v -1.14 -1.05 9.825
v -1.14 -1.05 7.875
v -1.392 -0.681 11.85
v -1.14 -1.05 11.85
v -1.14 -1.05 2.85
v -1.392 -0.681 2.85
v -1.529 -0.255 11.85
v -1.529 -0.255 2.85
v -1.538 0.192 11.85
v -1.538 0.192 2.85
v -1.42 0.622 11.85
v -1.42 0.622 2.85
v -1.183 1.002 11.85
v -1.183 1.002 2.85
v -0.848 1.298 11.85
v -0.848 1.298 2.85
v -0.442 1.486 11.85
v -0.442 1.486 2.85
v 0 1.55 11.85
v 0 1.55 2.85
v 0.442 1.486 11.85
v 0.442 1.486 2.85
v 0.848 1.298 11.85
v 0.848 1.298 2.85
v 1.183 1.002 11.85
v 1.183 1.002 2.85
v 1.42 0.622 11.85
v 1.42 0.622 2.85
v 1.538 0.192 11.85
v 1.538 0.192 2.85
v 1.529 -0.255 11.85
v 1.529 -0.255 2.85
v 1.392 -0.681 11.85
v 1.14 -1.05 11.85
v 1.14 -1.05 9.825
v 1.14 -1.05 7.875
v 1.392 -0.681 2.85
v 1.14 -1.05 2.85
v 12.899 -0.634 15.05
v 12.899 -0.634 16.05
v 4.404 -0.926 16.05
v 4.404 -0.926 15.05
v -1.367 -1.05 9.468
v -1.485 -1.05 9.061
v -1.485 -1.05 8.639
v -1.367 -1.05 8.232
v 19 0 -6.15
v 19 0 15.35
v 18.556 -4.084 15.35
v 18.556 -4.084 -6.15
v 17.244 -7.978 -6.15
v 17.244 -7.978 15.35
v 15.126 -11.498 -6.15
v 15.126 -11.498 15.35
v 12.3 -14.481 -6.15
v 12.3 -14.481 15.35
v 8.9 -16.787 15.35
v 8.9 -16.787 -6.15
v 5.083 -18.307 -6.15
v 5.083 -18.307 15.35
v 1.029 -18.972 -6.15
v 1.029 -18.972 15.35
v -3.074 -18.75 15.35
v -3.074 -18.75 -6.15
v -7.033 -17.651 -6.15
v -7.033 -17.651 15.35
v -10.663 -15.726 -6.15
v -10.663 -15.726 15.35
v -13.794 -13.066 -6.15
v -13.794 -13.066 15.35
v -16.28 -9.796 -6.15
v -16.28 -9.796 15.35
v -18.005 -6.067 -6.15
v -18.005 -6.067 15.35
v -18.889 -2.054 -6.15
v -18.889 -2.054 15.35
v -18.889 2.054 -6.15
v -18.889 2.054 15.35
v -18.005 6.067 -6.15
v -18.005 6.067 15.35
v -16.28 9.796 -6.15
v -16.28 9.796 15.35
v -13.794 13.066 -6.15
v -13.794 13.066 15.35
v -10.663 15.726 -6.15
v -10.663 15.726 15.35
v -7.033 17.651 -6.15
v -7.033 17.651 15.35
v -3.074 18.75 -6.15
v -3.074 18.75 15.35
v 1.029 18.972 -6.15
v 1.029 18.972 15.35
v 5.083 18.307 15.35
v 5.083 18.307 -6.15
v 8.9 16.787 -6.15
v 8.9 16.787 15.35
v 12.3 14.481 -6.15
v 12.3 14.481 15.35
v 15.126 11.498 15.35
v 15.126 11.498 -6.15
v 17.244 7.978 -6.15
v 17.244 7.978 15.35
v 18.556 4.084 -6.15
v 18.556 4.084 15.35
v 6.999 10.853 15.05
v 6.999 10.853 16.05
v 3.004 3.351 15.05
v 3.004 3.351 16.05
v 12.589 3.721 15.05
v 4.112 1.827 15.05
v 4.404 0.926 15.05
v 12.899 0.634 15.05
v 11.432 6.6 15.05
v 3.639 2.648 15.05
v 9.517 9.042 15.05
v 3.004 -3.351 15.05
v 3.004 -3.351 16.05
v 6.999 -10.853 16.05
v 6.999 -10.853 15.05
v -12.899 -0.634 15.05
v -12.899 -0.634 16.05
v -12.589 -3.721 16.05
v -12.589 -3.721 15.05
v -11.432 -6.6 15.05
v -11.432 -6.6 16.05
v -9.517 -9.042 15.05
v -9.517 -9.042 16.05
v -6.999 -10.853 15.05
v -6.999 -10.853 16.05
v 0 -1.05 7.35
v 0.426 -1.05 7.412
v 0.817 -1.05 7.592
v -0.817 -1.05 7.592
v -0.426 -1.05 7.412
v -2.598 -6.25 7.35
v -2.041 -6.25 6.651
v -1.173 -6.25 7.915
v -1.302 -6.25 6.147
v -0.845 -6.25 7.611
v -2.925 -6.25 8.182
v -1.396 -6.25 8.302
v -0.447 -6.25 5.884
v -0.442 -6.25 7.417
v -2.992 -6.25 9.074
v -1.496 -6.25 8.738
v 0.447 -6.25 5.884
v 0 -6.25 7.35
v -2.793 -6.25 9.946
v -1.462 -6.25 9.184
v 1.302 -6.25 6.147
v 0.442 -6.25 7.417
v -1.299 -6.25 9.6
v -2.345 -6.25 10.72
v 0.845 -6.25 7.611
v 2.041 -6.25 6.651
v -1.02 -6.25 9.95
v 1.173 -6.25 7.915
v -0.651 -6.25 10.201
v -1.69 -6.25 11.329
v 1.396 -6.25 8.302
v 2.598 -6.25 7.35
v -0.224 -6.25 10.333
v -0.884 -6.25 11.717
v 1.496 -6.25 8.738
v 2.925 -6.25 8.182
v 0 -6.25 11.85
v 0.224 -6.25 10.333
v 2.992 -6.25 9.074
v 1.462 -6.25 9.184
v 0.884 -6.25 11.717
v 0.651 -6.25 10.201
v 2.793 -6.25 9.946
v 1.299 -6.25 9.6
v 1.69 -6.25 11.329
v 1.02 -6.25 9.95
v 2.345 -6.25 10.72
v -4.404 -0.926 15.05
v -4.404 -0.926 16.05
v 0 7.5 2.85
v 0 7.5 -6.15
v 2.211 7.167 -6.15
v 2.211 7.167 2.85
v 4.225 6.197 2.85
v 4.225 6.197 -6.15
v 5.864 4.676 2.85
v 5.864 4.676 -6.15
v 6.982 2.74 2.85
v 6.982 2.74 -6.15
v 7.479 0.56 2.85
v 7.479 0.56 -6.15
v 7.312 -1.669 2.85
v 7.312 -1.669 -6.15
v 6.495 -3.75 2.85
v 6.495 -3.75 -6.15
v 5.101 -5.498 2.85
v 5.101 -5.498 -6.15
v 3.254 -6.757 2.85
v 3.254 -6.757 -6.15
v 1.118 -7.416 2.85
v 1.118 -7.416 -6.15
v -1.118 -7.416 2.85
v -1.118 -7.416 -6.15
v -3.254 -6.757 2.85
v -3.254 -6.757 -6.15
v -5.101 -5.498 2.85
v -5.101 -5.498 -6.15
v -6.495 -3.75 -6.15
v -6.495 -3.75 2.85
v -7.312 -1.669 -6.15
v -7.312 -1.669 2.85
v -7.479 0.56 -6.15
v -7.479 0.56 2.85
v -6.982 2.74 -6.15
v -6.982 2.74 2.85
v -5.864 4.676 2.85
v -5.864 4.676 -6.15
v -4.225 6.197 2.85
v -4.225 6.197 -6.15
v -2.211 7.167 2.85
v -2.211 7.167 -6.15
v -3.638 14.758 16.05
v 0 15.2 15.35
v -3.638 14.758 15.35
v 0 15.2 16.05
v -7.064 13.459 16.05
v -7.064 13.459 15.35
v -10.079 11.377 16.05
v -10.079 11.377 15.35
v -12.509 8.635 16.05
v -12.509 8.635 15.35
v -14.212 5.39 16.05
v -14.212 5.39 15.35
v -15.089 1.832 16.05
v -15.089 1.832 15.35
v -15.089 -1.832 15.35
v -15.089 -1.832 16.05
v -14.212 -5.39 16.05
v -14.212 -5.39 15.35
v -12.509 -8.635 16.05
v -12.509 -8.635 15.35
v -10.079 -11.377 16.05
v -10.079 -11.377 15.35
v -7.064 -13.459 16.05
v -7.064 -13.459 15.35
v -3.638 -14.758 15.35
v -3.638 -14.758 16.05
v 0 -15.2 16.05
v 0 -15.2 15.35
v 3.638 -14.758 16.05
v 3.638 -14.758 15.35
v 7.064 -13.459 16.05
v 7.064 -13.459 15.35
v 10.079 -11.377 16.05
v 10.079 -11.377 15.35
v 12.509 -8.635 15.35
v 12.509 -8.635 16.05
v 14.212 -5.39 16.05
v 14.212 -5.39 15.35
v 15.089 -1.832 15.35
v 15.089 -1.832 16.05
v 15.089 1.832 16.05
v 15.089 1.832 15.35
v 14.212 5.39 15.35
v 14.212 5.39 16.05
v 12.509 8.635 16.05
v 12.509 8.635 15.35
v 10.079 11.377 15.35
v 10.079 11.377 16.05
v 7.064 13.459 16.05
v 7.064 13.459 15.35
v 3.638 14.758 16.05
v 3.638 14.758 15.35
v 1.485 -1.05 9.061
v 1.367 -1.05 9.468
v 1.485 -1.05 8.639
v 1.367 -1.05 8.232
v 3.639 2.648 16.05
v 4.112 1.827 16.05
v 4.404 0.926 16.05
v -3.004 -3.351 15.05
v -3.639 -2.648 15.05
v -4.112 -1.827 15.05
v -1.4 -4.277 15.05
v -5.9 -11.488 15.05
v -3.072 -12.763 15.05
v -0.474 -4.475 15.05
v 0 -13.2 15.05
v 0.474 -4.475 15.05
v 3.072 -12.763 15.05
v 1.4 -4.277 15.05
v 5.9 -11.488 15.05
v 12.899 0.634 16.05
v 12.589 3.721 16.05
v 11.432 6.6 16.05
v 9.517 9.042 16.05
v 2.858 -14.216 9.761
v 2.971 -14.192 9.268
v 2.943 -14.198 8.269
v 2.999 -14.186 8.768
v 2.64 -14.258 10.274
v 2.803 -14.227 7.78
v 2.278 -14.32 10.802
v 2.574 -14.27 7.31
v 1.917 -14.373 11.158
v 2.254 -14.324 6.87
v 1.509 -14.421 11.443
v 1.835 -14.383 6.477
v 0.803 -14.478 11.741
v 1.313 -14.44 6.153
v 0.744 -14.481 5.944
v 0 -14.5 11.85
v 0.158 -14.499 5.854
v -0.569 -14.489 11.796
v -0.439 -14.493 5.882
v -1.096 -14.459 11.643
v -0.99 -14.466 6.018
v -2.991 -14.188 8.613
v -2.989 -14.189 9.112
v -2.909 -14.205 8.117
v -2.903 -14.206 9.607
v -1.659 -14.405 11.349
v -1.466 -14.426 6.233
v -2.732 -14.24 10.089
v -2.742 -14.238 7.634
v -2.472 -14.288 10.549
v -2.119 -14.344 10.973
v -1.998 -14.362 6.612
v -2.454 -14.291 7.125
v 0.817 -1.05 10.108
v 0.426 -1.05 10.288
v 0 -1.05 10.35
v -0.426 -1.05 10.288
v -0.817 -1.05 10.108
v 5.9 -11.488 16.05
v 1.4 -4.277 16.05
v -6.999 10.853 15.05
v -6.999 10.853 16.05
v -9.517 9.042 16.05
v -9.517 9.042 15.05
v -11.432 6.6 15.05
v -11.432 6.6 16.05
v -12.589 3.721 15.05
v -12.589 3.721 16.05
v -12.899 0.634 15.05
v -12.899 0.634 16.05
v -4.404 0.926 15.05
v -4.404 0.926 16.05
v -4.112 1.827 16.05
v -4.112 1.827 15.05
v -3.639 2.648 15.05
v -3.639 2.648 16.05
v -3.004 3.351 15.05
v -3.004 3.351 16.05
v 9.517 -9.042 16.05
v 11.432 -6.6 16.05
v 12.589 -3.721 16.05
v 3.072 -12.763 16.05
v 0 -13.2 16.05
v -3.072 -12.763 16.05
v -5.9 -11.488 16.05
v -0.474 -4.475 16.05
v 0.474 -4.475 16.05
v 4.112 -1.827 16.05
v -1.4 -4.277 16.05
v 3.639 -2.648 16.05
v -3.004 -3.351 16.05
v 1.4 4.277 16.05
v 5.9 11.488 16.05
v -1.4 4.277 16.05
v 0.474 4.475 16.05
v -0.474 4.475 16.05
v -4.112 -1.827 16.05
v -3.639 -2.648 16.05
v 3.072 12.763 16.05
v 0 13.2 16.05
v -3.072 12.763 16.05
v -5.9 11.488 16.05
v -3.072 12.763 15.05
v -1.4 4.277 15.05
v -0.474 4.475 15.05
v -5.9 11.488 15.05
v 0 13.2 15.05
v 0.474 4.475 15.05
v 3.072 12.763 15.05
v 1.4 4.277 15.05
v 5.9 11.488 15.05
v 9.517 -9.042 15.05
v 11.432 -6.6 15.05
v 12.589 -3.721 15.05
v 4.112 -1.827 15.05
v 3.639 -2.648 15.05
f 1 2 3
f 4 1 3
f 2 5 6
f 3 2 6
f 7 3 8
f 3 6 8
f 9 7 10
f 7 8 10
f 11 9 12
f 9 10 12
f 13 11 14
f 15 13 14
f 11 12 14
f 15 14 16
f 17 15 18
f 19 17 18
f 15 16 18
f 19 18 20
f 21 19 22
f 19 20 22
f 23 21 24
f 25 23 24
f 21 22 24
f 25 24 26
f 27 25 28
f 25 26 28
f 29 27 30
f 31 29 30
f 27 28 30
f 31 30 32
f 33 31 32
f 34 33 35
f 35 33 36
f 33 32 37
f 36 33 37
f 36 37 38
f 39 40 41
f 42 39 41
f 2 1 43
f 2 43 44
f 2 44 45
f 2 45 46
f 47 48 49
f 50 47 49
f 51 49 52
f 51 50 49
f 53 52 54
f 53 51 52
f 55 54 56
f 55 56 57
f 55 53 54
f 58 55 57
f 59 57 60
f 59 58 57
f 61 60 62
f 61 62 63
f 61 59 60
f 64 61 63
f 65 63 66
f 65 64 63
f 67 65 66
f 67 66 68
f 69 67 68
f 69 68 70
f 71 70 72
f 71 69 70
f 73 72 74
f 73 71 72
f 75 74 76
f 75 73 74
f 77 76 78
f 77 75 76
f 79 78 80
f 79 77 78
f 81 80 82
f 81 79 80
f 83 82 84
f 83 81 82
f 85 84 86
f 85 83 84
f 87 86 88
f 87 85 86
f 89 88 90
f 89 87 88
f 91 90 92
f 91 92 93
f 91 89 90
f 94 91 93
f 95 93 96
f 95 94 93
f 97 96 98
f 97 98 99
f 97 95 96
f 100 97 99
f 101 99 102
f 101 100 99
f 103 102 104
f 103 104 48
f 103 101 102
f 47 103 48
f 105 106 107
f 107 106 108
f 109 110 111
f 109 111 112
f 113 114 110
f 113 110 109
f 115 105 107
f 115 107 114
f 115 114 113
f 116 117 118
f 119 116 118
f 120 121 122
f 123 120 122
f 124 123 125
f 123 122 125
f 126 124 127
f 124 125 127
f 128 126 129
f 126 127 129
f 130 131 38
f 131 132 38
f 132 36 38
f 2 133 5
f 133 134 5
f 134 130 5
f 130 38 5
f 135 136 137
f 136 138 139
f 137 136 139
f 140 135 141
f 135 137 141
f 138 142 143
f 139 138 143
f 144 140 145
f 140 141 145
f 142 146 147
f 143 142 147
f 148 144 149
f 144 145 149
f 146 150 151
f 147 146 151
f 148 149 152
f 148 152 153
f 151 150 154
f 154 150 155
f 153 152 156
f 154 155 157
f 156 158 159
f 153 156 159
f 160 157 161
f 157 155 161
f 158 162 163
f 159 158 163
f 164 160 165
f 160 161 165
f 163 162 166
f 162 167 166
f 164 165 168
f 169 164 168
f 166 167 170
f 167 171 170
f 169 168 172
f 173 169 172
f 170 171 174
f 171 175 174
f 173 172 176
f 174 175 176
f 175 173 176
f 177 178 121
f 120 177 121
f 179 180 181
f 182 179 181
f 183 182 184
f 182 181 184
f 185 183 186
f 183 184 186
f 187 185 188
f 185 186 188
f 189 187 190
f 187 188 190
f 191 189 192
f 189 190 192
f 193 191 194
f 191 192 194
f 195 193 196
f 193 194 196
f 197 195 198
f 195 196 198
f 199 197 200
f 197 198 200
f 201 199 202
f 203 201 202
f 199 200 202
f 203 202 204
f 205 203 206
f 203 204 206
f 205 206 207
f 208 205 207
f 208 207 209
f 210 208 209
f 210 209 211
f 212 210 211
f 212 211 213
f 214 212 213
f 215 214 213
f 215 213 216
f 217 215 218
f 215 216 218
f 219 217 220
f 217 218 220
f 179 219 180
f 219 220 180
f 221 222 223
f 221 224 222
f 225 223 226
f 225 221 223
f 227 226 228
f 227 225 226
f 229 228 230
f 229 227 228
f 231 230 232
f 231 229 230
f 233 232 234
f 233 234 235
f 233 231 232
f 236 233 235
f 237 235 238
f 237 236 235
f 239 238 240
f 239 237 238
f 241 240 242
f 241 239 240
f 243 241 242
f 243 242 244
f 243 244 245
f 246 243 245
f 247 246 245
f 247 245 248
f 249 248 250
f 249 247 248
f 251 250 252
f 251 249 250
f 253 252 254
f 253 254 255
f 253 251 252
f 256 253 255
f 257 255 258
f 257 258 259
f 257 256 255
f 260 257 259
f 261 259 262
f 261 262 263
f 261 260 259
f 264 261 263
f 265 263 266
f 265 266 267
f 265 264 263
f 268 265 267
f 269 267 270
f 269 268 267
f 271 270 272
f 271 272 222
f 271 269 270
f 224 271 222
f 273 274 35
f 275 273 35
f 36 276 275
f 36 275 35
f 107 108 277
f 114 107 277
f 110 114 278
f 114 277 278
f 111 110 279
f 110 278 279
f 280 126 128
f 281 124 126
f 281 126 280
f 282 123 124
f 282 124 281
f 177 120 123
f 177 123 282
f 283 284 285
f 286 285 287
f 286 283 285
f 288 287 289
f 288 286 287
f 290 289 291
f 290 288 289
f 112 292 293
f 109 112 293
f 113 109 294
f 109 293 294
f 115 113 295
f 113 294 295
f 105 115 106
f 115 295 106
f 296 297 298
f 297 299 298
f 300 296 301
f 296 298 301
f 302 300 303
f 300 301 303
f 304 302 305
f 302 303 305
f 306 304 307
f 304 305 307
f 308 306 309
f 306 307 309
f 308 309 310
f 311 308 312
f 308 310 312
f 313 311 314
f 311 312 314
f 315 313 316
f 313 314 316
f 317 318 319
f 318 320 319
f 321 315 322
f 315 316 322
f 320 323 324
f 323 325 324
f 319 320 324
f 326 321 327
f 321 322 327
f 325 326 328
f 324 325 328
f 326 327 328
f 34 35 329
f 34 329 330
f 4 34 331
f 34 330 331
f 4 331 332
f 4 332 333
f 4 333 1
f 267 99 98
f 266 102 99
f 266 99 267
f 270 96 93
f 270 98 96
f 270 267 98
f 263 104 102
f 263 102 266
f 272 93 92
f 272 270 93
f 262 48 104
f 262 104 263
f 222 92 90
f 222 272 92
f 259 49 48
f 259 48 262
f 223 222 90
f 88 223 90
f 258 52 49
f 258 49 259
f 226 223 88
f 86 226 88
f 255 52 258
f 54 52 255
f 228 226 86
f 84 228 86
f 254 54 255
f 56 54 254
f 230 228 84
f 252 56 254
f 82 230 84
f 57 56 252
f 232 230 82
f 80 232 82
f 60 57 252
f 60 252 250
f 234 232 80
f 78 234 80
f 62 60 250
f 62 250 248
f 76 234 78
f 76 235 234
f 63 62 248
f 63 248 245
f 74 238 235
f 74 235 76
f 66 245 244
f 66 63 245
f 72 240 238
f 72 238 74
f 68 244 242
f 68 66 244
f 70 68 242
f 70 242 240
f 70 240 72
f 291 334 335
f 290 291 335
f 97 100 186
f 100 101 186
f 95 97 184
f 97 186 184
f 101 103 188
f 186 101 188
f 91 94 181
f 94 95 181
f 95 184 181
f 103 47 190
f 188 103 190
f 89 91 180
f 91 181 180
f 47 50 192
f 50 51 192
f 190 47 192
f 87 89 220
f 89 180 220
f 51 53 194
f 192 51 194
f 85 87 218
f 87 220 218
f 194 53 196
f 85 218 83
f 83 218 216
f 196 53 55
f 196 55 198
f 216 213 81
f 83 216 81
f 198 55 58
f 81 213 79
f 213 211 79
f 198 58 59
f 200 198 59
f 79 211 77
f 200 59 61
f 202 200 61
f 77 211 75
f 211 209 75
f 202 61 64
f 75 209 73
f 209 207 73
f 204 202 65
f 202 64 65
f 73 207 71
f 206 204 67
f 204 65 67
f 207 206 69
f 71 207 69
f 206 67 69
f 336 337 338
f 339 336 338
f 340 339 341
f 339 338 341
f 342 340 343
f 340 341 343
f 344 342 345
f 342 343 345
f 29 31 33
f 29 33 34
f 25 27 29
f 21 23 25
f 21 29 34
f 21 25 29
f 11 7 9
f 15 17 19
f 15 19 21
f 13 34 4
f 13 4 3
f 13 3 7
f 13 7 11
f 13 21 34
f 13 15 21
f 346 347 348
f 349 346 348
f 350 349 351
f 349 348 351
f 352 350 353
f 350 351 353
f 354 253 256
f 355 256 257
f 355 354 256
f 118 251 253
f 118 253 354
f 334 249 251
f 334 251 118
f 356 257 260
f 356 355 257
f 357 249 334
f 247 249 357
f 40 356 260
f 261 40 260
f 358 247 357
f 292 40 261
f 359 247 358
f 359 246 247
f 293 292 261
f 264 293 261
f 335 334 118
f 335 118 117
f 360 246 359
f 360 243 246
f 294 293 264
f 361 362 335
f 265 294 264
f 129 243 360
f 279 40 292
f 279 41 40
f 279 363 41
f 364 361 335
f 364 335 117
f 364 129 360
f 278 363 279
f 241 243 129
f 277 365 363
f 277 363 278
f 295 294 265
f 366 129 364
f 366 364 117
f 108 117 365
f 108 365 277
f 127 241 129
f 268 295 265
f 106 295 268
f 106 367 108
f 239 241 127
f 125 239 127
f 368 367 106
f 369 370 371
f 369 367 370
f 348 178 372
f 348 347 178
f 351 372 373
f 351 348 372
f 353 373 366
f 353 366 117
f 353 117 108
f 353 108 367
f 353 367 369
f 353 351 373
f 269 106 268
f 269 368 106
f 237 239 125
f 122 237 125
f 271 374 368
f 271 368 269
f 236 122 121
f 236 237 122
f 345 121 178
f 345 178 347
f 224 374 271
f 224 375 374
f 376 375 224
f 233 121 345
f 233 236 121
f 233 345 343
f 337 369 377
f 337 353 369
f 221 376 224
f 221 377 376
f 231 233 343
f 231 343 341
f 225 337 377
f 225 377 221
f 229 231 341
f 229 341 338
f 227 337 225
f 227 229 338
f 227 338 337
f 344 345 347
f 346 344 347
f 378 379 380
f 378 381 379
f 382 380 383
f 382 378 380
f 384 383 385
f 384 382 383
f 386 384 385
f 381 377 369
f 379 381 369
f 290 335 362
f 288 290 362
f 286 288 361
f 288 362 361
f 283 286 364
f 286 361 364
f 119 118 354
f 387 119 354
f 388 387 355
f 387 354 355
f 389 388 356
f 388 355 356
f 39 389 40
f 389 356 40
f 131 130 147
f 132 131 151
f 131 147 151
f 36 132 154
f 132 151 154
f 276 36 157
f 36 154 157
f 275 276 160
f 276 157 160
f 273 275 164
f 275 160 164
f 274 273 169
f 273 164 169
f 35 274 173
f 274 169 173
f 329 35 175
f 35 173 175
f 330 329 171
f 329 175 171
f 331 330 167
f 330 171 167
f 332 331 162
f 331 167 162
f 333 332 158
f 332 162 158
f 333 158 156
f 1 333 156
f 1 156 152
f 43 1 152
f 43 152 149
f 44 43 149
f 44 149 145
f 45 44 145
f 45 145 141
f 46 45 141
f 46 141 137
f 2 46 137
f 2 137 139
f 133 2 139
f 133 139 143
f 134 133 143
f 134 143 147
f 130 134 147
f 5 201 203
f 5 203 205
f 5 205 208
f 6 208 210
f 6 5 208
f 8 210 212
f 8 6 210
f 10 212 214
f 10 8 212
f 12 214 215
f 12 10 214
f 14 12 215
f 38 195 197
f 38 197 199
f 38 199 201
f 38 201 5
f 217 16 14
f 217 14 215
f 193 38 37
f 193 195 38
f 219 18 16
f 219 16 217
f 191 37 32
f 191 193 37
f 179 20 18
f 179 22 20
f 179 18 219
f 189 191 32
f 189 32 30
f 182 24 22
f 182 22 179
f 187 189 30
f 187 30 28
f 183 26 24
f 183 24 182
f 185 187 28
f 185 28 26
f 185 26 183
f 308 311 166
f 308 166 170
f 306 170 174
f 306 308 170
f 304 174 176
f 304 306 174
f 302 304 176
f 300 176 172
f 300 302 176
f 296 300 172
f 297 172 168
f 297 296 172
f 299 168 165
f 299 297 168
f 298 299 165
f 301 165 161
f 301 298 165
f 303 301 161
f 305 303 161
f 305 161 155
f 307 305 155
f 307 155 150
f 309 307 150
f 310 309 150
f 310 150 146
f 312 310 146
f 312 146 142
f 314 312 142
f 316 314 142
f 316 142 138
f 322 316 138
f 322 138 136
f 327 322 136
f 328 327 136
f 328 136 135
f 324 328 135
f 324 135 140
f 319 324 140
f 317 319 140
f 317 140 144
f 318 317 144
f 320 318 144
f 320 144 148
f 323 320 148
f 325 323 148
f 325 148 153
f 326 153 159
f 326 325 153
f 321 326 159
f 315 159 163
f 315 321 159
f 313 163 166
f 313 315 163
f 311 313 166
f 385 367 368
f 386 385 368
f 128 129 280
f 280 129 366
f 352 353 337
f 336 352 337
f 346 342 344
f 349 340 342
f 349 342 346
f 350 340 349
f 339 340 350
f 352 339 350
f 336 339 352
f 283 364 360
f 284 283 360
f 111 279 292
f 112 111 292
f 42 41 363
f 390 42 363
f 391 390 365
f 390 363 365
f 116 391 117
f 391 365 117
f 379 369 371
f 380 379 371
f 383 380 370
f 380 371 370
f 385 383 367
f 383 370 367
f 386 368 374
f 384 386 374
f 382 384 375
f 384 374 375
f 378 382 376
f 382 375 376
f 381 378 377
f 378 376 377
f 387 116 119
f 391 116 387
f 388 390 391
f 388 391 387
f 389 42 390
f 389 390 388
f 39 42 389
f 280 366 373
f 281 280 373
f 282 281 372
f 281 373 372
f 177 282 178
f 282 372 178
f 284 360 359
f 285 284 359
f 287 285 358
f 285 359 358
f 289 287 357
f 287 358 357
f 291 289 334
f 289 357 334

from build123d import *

# Parameters (mm, degrees)
CORTAR_EXTRUIR4_DEPTH      = 1
CROQUIS7_R                 = 7.5
CORTAR_EXTRUIR5_DEPTH      = 9
CORTAR_EXTRUIR6_DEPTH      = 9
CORTAR_EXTRUIR8_DEPTH      = 5
CORTAR_EXTRUIR8_DEPTH_BACK = 35.470929781
CROQUIS10_R                = 3
CROQUIS11_R                = 1.5
CORTAR_EXTRUIR9_DEPTH      = 5.2
CROQUIS12_W                = 21.5
CROQUIS12_H                = 4.5


with BuildPart() as part:
    # Croquis1 → Revolución1 (revolve)
    with BuildSketch(Plane(origin=(0, 0, 0), x_dir=(0, 0, -1), z_dir=(1, 0, 0))):
        Polygon((0, 0), (6.15, 0), (6.15, 14.5), (-15.35, 14.5), (-15.35, 15.2), (-16.05, 15.2), (-16.05, 0), align=None)
    revolve(axis=Axis((0, 0, 0), (0, 0, 1)))

    # Croquis5 → Cortar-Extruir4 (cut)
    with BuildSketch(Plane.XY.offset(16.05)):
        with BuildLine():
            ThreePointArc((-1.4, 4.276680956), (0, 4.5), (1.4, 4.276680956))
            Line((1.4, 4.276680956), (5.9, 11.487783507))
            ThreePointArc((5.9, 11.487783507), (0, 13.2), (-5.9, 11.487783507))
            Line((-5.9, 11.487783507), (-1.4, 4.276680956))
        make_face()
        with BuildLine():
            Line((6.99871235, 10.853441636), (3.003714352, 3.350776043))
            ThreePointArc((3.003714352, 3.350776043), (3.897114317, 2.25), (4.403714352, 0.925904913))
            Line((4.403714352, 0.925904913), (12.89871235, 0.634341871))
            ThreePointArc((12.89871235, 0.634341871), (11.43153533, 6.6), (6.99871235, 10.853441636))
        make_face()
        with BuildLine():
            Line((12.89871235, -0.634341871), (4.403714352, -0.925904913))
            ThreePointArc((4.403714352, -0.925904913), (3.897114317, -2.25), (3.003714352, -3.350776043))
            Line((3.003714352, -3.350776043), (6.99871235, -10.853441636))
            ThreePointArc((6.99871235, -10.853441636), (11.43153533, -6.6), (12.89871235, -0.634341871))
        make_face()
        with BuildLine():
            Line((5.9, -11.487783507), (1.4, -4.276680956))
            ThreePointArc((1.4, -4.276680956), (0, -4.5), (-1.4, -4.276680956))
            Line((-1.4, -4.276680956), (-5.9, -11.487783507))
            ThreePointArc((-5.9, -11.487783507), (0, -13.2), (5.9, -11.487783507))
        make_face()
        with BuildLine():
            ThreePointArc((-3.003714352, -3.350776043), (-3.897114317, -2.25), (-4.403714352, -0.925904913))
            Line((-4.403714352, -0.925904913), (-12.89871235, -0.634341871))
            ThreePointArc((-12.89871235, -0.634341871), (-11.43153533, -6.6), (-6.99871235, -10.853441636))
            Line((-6.99871235, -10.853441636), (-3.003714352, -3.350776043))
        make_face()
        with BuildLine():
            ThreePointArc((-4.403714352, 0.925904913), (-3.897114317, 2.25), (-3.003714352, 3.350776043))
            Line((-3.003714352, 3.350776043), (-6.99871235, 10.853441636))
            ThreePointArc((-6.99871235, 10.853441636), (-11.43153533, 6.6), (-12.89871235, 0.634341871))
            Line((-12.89871235, 0.634341871), (-4.403714352, 0.925904913))
        make_face()
    extrude(amount=-CORTAR_EXTRUIR4_DEPTH, mode=Mode.SUBTRACT)

    # Croquis7 → Cortar-Extruir5 (cut)
    with BuildSketch(Plane(origin=(0, 0, -6.15), x_dir=(-1, 0, 0), z_dir=(0, 0, -1))):
        with Locations(Location((0, 0, 0), (0, 0, 90))):
            Circle(CROQUIS7_R)
    extrude(amount=-CORTAR_EXTRUIR5_DEPTH, mode=Mode.SUBTRACT)

    # Croquis8 → Cortar-Extruir6 (cut)
    with BuildSketch(Plane(origin=(0, 0, 2.85), x_dir=(-1, 0, 0), z_dir=(0, 0, -1))):
        with BuildLine():
            Line((-1.140175425, -1.05), (1.140175425, -1.05))
            ThreePointArc((1.140175425, -1.05), (0, 1.55), (-1.140175425, -1.05))
        make_face()
    extrude(amount=-CORTAR_EXTRUIR6_DEPTH, mode=Mode.SUBTRACT)

    # Croquis10 → Cortar-Extruir8 (cut, two sides: drawn at the far end of the back side and taken through both)
    with BuildSketch(Plane(origin=(0, -11.25, 0), x_dir=(1, 0, 0), z_dir=(0, 1, 0)).offset(-CORTAR_EXTRUIR8_DEPTH_BACK)):
        with Locations(Location((0, -8.85, 0), (0, 0, 270))):
            Circle(CROQUIS10_R)
    extrude(amount=CORTAR_EXTRUIR8_DEPTH + CORTAR_EXTRUIR8_DEPTH_BACK, mode=Mode.SUBTRACT)

    # Croquis11 → Cortar-Extruir9 (cut)
    with BuildSketch(Plane.XZ.offset(6.25)):
        with Locations(Location((0, 8.85, 0), (0, 0, 270))):
            Circle(CROQUIS11_R)
    extrude(amount=-CORTAR_EXTRUIR9_DEPTH, mode=Mode.SUBTRACT)

    # Croquis12 → Revolución2 (revolve)
    with BuildSketch(Plane(origin=(0, 0, 0), x_dir=(0, 0, -1), z_dir=(1, 0, 0)), mode=Mode.PRIVATE) as revoluci_n2_sk:
        with Locations((-4.6, 16.75)):
            Rectangle(CROQUIS12_W, CROQUIS12_H)
    revolve(revoluci_n2_sk.sketch.rotate(Axis((0, 0, 12.043120257), (0, 0, -1)), 90), axis=Axis((0, 0, 12.043120257), (0, 0, -1)))


solid = part.part
